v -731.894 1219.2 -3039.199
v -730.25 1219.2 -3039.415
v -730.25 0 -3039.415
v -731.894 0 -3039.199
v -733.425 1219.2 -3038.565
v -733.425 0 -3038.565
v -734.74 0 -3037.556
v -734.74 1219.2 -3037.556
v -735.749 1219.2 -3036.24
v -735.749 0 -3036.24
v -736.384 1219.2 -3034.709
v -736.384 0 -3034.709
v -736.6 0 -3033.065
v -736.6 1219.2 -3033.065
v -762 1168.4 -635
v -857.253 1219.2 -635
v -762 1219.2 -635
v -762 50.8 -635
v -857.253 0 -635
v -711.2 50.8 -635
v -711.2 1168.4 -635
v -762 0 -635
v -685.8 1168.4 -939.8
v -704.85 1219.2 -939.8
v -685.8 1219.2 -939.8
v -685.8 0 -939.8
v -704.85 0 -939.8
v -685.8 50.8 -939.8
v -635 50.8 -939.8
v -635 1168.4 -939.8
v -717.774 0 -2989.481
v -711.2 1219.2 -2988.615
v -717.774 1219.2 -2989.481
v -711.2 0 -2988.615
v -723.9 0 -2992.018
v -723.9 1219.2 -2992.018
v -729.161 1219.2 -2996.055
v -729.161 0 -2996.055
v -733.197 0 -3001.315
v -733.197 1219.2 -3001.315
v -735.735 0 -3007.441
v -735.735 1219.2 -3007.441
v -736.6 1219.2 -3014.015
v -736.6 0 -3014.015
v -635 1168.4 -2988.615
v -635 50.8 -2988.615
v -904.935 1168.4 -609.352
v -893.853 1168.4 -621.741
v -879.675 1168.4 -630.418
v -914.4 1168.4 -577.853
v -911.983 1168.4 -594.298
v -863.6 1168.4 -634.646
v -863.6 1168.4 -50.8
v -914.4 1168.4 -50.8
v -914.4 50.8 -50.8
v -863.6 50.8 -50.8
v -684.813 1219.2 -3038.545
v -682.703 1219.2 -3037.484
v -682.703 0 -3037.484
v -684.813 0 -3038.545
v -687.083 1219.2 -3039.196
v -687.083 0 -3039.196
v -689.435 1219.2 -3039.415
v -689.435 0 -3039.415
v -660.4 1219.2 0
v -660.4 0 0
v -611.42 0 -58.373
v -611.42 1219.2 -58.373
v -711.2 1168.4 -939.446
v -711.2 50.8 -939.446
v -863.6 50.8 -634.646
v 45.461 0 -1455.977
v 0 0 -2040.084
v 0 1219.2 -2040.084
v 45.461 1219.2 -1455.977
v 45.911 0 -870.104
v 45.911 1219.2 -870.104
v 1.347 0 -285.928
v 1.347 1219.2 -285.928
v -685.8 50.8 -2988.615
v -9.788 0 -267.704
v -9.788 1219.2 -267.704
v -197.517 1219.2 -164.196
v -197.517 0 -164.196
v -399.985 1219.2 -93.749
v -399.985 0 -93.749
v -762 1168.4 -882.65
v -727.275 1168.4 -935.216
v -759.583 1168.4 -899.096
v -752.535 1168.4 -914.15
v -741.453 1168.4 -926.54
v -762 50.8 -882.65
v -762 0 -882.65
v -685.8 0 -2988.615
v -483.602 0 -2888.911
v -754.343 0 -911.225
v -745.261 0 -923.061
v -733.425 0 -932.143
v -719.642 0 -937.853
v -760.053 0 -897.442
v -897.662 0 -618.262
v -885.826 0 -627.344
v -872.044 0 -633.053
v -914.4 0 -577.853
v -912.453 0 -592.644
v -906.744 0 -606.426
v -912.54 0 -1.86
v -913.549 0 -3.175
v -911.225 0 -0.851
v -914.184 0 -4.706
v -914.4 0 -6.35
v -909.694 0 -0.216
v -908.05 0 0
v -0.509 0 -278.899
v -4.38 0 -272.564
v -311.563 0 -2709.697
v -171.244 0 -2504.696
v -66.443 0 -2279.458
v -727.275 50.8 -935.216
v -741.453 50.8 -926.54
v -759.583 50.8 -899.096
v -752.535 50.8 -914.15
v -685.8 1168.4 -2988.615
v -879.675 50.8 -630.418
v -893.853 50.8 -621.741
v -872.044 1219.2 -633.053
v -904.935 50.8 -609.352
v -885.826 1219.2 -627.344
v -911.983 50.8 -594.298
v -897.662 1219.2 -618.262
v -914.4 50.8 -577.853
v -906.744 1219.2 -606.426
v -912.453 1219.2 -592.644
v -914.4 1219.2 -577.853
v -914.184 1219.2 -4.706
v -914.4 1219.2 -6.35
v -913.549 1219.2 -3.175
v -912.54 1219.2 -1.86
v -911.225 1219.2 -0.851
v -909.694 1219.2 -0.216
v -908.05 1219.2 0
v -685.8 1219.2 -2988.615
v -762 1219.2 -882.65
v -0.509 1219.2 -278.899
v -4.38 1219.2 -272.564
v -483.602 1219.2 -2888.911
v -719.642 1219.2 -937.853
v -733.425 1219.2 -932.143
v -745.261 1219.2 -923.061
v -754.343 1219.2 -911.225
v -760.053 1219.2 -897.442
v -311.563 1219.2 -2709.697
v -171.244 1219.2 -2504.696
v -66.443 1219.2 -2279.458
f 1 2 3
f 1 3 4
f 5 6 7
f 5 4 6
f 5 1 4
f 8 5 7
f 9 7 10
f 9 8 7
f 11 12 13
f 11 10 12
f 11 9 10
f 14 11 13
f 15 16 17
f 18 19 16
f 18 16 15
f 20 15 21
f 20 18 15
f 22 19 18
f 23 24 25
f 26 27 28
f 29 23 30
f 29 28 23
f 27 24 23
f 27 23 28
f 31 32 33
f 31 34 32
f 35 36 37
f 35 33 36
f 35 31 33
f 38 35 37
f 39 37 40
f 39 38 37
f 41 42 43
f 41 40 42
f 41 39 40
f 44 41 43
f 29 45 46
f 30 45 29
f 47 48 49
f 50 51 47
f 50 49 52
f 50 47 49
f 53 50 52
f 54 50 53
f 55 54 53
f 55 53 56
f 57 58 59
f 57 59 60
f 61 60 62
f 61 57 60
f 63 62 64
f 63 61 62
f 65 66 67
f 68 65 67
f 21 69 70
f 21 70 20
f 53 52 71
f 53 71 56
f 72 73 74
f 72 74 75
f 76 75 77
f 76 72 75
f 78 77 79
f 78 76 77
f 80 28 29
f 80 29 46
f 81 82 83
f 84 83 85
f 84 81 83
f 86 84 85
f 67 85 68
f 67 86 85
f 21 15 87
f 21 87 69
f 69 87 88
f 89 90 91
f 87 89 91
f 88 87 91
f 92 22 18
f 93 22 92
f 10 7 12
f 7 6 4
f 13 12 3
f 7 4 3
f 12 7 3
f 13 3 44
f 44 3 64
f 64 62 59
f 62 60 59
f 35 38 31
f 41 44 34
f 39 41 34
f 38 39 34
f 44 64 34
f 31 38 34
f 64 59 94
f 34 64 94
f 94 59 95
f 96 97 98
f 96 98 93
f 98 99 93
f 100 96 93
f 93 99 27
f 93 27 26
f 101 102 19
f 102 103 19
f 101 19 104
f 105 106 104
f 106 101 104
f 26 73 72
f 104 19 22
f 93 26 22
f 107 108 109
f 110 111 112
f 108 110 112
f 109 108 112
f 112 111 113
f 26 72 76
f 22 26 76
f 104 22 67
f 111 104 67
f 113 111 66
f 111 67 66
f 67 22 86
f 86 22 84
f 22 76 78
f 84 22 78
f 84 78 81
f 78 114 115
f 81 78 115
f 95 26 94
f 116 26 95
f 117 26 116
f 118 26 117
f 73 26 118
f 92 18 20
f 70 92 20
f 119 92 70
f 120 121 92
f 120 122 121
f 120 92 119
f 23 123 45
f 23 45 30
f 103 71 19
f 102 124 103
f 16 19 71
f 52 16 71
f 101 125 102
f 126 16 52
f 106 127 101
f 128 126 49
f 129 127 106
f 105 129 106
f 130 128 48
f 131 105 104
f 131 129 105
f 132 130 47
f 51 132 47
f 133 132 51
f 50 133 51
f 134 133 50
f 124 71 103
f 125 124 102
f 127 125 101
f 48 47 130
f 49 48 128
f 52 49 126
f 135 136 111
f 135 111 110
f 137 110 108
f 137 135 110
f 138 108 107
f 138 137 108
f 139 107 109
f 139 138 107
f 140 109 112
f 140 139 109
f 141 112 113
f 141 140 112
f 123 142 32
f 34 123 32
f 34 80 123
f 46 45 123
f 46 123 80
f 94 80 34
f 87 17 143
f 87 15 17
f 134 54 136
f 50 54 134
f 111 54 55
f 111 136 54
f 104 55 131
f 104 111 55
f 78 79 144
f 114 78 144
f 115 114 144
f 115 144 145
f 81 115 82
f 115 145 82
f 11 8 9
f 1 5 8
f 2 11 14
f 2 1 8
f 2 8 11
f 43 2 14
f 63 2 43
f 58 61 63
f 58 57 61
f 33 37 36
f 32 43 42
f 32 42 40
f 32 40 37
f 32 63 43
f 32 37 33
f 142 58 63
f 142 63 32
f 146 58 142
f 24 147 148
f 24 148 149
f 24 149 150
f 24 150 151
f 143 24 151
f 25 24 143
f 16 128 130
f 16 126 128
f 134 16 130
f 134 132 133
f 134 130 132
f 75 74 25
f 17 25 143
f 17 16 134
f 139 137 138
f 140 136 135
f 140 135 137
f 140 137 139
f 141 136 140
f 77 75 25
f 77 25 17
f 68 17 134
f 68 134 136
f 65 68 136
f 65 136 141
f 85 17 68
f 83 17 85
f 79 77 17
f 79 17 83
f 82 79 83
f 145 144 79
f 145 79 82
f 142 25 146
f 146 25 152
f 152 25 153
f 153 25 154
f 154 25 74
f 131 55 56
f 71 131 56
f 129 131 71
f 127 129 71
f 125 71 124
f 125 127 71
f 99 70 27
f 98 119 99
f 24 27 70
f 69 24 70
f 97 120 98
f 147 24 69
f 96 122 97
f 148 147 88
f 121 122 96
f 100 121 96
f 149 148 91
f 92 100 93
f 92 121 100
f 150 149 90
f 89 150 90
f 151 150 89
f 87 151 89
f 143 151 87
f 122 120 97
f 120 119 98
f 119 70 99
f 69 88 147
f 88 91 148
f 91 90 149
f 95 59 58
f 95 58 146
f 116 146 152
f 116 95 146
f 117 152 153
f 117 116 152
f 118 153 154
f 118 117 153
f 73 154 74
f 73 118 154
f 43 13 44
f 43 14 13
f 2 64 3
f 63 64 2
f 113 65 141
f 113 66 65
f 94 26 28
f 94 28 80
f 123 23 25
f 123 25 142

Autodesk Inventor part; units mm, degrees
ref_plane "YZ Plane" through (0, 0, 0) normal (1, 0, 0) x (0, 1, 0)
ref_plane "XZ Plane" through (0, 0, 0) normal (0, 1, 0) x (-1, 0, 0)
ref_plane "XY Plane" through (0, 0, 0) normal (0, 0, 1) x (1, 0, 0)
sketch "Sketch1" plane through (0, 0, 0) normal (0, 1, 0) x (-1, 0, 0)
  line L0 (0, 0) -> (914.4, 0)
  line L1 (914.4, 0) -> (914.4, -70.0282)
  line L2 (0, 0) -> (508, 0)
  line L3 (914.4, 0) -> (660.4, 0)
  line L4 (660.4, 0) -> (611.4196, -58.3726)
  arc A0 (611.4196, -58.3726) -> (0, -274.3016) centre (714.4556, -1323.7323) ccw
  arc A1 (0, -2040.0836) -> (685.8, -3039.4154) centre (1482.9763, -1757.3624) ccw
  arc A2 (0, -274.3016) -> (0, -2040.0836) centre (7568.6791, -1157.1926) ccw
  line L5 (914.4, 0) -> (660.4, 0)
  line L6 (914.4, 0) -> (914.4, -635)
  line L7 (914.4, -635) -> (762, -635)
  line L8 (762, -635) -> (762, -939.8)
  line L9 (762, -939.8) -> (685.8, -939.8)
  line L10 (685.8, -939.8) -> (685.8, -3039.4154)
  dimension "d1" = 3048
  dimension "d2" = 508
  dimension "d11" = 76.2
  dimension "d12" = 130
  dimension "d14" = 7620
  dimension "d15" = 635
  dimension "d16" = 152.4
  dimension "d17" = 304.8
  dimension "d18" = 76.2
extrude "Extrusion1" add sketch "Sketch1" along normal blind 1219.2
sketch "Sketch3" plane through (-914.4, 0, -635) normal (-1, 0, 0) x (0, 0, 1)
  line L0 (0, 0) -> (635, 0) projected
  line L1 (0, 0) -> (0, 1219.2) projected
  line L2 (635, 0) -> (0, 0)
  line L3 (0, 0) -> (0, 1219.2)
  line L4 (0, 1219.2) -> (635, 1219.2)
  line L5 (635, 1219.2) -> (635, 0)
  line L6 (584.2, 50.8) -> (50.8, 50.8)
  line L7 (50.8, 1168.4) -> (584.2, 1168.4)
  line L8 (584.2, 1168.4) -> (584.2, 50.8)
  line L9 (50.8, 50.8) -> (0, 50.8)
  line L10 (0, 0) -> (0, 1219.2) projected
  line L11 (0, 50.8) -> (0, 1168.4)
  line L12 (50.8, 1168.4) -> (0, 1168.4)
  point P0 (0, 1168.4)
  dimension "d24" = 50.8
extrude "Extrusion3" cut sketch "Sketch3" against normal blind 50.8 contours L1 L12 L7 L8 L6 L9
sketch "Sketch4" plane through (-762, 0, -939.8) normal (-1, 0, 0) x (0, 0, 1)
  line L0 (0, 1219.2) -> (304.8, 1219.2) projected
  line L1 (304.8, 0) -> (0, 0)
  line L2 (0, 0) -> (0, 1219.2)
  line L3 (0, 1219.2) -> (304.8, 1219.2)
  line L4 (304.8, 1219.2) -> (304.8, 0)
  line L5 (254, 50.8) -> (50.8, 50.8)
  line L6 (50.8, 1168.4) -> (254, 1168.4)
  line L7 (50.8, 1168.4) -> (0, 1168.4)
  line L8 (0, 0) -> (0, 1219.2) projected
  line L9 (50.8, 50.8) -> (0, 50.8)
  line L10 (0, 50.8) -> (0, 1168.4)
  line L11 (254, 50.8) -> (304.8, 50.8)
  line L12 (304.8, 50.8) -> (304.8, 1168.4)
  line L13 (304.8, 0) -> (304.8, 1219.2) projected
  line L14 (254, 1168.4) -> (304.8, 1168.4)
  point P0 (939.8, 0)
extrude "Extrusion4" cut sketch "Sketch4" against normal blind 50.8 contours L7 L6 L14 L4 L11 L5 L9 L2
sketch "Sketch5" plane through (-685.8, 0, -3039.4154) normal (-1, 0, 0) x (0, 0, 1)
  line L0 (0, 1219.2) -> (2099.6154, 1219.2) projected
  line L1 (2099.6154, 0) -> (0, 0)
  line L2 (0, 0) -> (0, 1219.2)
  line L3 (0, 1219.2) -> (2099.6154, 1219.2)
  line L4 (2099.6154, 1219.2) -> (2099.6154, 0)
  line L5 (2048.8154, 50.8) -> (50.8, 50.8)
  line L6 (50.8, 50.8) -> (50.8, 1168.4)
  line L7 (50.8, 1168.4) -> (2048.8154, 1168.4)
  line L8 (2048.8154, 50.8) -> (2099.6154, 50.8)
  line L9 (2099.6154, 0) -> (2099.6154, 1219.2) projected
  line L10 (2099.6154, 1168.4) -> (2099.6154, 1219.2) projected
  line L11 (2048.8154, 1168.4) -> (2099.6154, 1168.4)
  line L12 (2099.6154, 1168.4) -> (2099.6154, 50.8)
  point P0 (3039.4154, 0)
extrude "Extrusion5" cut sketch "Sketch5" against normal blind 50.8 contours L4 L8 L5 L6 L7 L11
sketch "Sketch6" plane through (-685.8, 0, -3039.4154) normal (-1, 0, 0) x (0, 0, 1)
  line L0 (0, 0) -> (0, 1219.2) projected
  line L1 (0, 0) -> (2099.6154, 0) projected
  line L2 (0, 1219.2) -> (50.8, 1219.2)
  line L3 (50.8, 1219.2) -> (50.8, 0)
  line L4 (50.8, 0) -> (0, 0)
  line L5 (0, 0) -> (0, 1219.2)
  point P0 (3039.4154, 0)
  dimension "d33" = 50.8
extrude "Extrusion6" add sketch "Sketch6" along normal blind 50.8
fillet "Fillet1" radius 25.4 1 edges at (-736.6, 609.6, -2988.6154)
fillet "Fillet2" radius 6.35 1 edges at (-736.6, 609.6, -3039.4154)
fillet "Fillet3" radius 12.7 1 edges at (-685.8, 609.6, -3039.4154)
fillet "Fillet4" radius 25.4 1 edges at (0, 609.6, -274.3016)
fillet "Fillet5" radius 57.15 1 edges at (-914.4, 1193.8, -635)
fillet "Fillet6" radius 57.15 1 edges at (-762, 1193.8, -939.8)
fillet "Fillet7" radius 6.35 1 edges at (-914.4, 609.6, 0)
ref_plane "Work Plane1" through (26.7091, 0, -1757.3624) normal (-1, 0, 0) x (0, -1, 0)
sketch "Sketch8" plane through (26.7091, 0, -1757.3624) normal (-1, 0, 0) x (0, -1, 0)
  point P0 (0, 1757.3624)
ref_plane "Work Plane2" through (-760.6909, 0, -1757.3624) normal (-1, 0, 0) x (0, -1, 0)
properties part number "ShipDesign-ver2-1111-2021" material "Wood (Oak)"
